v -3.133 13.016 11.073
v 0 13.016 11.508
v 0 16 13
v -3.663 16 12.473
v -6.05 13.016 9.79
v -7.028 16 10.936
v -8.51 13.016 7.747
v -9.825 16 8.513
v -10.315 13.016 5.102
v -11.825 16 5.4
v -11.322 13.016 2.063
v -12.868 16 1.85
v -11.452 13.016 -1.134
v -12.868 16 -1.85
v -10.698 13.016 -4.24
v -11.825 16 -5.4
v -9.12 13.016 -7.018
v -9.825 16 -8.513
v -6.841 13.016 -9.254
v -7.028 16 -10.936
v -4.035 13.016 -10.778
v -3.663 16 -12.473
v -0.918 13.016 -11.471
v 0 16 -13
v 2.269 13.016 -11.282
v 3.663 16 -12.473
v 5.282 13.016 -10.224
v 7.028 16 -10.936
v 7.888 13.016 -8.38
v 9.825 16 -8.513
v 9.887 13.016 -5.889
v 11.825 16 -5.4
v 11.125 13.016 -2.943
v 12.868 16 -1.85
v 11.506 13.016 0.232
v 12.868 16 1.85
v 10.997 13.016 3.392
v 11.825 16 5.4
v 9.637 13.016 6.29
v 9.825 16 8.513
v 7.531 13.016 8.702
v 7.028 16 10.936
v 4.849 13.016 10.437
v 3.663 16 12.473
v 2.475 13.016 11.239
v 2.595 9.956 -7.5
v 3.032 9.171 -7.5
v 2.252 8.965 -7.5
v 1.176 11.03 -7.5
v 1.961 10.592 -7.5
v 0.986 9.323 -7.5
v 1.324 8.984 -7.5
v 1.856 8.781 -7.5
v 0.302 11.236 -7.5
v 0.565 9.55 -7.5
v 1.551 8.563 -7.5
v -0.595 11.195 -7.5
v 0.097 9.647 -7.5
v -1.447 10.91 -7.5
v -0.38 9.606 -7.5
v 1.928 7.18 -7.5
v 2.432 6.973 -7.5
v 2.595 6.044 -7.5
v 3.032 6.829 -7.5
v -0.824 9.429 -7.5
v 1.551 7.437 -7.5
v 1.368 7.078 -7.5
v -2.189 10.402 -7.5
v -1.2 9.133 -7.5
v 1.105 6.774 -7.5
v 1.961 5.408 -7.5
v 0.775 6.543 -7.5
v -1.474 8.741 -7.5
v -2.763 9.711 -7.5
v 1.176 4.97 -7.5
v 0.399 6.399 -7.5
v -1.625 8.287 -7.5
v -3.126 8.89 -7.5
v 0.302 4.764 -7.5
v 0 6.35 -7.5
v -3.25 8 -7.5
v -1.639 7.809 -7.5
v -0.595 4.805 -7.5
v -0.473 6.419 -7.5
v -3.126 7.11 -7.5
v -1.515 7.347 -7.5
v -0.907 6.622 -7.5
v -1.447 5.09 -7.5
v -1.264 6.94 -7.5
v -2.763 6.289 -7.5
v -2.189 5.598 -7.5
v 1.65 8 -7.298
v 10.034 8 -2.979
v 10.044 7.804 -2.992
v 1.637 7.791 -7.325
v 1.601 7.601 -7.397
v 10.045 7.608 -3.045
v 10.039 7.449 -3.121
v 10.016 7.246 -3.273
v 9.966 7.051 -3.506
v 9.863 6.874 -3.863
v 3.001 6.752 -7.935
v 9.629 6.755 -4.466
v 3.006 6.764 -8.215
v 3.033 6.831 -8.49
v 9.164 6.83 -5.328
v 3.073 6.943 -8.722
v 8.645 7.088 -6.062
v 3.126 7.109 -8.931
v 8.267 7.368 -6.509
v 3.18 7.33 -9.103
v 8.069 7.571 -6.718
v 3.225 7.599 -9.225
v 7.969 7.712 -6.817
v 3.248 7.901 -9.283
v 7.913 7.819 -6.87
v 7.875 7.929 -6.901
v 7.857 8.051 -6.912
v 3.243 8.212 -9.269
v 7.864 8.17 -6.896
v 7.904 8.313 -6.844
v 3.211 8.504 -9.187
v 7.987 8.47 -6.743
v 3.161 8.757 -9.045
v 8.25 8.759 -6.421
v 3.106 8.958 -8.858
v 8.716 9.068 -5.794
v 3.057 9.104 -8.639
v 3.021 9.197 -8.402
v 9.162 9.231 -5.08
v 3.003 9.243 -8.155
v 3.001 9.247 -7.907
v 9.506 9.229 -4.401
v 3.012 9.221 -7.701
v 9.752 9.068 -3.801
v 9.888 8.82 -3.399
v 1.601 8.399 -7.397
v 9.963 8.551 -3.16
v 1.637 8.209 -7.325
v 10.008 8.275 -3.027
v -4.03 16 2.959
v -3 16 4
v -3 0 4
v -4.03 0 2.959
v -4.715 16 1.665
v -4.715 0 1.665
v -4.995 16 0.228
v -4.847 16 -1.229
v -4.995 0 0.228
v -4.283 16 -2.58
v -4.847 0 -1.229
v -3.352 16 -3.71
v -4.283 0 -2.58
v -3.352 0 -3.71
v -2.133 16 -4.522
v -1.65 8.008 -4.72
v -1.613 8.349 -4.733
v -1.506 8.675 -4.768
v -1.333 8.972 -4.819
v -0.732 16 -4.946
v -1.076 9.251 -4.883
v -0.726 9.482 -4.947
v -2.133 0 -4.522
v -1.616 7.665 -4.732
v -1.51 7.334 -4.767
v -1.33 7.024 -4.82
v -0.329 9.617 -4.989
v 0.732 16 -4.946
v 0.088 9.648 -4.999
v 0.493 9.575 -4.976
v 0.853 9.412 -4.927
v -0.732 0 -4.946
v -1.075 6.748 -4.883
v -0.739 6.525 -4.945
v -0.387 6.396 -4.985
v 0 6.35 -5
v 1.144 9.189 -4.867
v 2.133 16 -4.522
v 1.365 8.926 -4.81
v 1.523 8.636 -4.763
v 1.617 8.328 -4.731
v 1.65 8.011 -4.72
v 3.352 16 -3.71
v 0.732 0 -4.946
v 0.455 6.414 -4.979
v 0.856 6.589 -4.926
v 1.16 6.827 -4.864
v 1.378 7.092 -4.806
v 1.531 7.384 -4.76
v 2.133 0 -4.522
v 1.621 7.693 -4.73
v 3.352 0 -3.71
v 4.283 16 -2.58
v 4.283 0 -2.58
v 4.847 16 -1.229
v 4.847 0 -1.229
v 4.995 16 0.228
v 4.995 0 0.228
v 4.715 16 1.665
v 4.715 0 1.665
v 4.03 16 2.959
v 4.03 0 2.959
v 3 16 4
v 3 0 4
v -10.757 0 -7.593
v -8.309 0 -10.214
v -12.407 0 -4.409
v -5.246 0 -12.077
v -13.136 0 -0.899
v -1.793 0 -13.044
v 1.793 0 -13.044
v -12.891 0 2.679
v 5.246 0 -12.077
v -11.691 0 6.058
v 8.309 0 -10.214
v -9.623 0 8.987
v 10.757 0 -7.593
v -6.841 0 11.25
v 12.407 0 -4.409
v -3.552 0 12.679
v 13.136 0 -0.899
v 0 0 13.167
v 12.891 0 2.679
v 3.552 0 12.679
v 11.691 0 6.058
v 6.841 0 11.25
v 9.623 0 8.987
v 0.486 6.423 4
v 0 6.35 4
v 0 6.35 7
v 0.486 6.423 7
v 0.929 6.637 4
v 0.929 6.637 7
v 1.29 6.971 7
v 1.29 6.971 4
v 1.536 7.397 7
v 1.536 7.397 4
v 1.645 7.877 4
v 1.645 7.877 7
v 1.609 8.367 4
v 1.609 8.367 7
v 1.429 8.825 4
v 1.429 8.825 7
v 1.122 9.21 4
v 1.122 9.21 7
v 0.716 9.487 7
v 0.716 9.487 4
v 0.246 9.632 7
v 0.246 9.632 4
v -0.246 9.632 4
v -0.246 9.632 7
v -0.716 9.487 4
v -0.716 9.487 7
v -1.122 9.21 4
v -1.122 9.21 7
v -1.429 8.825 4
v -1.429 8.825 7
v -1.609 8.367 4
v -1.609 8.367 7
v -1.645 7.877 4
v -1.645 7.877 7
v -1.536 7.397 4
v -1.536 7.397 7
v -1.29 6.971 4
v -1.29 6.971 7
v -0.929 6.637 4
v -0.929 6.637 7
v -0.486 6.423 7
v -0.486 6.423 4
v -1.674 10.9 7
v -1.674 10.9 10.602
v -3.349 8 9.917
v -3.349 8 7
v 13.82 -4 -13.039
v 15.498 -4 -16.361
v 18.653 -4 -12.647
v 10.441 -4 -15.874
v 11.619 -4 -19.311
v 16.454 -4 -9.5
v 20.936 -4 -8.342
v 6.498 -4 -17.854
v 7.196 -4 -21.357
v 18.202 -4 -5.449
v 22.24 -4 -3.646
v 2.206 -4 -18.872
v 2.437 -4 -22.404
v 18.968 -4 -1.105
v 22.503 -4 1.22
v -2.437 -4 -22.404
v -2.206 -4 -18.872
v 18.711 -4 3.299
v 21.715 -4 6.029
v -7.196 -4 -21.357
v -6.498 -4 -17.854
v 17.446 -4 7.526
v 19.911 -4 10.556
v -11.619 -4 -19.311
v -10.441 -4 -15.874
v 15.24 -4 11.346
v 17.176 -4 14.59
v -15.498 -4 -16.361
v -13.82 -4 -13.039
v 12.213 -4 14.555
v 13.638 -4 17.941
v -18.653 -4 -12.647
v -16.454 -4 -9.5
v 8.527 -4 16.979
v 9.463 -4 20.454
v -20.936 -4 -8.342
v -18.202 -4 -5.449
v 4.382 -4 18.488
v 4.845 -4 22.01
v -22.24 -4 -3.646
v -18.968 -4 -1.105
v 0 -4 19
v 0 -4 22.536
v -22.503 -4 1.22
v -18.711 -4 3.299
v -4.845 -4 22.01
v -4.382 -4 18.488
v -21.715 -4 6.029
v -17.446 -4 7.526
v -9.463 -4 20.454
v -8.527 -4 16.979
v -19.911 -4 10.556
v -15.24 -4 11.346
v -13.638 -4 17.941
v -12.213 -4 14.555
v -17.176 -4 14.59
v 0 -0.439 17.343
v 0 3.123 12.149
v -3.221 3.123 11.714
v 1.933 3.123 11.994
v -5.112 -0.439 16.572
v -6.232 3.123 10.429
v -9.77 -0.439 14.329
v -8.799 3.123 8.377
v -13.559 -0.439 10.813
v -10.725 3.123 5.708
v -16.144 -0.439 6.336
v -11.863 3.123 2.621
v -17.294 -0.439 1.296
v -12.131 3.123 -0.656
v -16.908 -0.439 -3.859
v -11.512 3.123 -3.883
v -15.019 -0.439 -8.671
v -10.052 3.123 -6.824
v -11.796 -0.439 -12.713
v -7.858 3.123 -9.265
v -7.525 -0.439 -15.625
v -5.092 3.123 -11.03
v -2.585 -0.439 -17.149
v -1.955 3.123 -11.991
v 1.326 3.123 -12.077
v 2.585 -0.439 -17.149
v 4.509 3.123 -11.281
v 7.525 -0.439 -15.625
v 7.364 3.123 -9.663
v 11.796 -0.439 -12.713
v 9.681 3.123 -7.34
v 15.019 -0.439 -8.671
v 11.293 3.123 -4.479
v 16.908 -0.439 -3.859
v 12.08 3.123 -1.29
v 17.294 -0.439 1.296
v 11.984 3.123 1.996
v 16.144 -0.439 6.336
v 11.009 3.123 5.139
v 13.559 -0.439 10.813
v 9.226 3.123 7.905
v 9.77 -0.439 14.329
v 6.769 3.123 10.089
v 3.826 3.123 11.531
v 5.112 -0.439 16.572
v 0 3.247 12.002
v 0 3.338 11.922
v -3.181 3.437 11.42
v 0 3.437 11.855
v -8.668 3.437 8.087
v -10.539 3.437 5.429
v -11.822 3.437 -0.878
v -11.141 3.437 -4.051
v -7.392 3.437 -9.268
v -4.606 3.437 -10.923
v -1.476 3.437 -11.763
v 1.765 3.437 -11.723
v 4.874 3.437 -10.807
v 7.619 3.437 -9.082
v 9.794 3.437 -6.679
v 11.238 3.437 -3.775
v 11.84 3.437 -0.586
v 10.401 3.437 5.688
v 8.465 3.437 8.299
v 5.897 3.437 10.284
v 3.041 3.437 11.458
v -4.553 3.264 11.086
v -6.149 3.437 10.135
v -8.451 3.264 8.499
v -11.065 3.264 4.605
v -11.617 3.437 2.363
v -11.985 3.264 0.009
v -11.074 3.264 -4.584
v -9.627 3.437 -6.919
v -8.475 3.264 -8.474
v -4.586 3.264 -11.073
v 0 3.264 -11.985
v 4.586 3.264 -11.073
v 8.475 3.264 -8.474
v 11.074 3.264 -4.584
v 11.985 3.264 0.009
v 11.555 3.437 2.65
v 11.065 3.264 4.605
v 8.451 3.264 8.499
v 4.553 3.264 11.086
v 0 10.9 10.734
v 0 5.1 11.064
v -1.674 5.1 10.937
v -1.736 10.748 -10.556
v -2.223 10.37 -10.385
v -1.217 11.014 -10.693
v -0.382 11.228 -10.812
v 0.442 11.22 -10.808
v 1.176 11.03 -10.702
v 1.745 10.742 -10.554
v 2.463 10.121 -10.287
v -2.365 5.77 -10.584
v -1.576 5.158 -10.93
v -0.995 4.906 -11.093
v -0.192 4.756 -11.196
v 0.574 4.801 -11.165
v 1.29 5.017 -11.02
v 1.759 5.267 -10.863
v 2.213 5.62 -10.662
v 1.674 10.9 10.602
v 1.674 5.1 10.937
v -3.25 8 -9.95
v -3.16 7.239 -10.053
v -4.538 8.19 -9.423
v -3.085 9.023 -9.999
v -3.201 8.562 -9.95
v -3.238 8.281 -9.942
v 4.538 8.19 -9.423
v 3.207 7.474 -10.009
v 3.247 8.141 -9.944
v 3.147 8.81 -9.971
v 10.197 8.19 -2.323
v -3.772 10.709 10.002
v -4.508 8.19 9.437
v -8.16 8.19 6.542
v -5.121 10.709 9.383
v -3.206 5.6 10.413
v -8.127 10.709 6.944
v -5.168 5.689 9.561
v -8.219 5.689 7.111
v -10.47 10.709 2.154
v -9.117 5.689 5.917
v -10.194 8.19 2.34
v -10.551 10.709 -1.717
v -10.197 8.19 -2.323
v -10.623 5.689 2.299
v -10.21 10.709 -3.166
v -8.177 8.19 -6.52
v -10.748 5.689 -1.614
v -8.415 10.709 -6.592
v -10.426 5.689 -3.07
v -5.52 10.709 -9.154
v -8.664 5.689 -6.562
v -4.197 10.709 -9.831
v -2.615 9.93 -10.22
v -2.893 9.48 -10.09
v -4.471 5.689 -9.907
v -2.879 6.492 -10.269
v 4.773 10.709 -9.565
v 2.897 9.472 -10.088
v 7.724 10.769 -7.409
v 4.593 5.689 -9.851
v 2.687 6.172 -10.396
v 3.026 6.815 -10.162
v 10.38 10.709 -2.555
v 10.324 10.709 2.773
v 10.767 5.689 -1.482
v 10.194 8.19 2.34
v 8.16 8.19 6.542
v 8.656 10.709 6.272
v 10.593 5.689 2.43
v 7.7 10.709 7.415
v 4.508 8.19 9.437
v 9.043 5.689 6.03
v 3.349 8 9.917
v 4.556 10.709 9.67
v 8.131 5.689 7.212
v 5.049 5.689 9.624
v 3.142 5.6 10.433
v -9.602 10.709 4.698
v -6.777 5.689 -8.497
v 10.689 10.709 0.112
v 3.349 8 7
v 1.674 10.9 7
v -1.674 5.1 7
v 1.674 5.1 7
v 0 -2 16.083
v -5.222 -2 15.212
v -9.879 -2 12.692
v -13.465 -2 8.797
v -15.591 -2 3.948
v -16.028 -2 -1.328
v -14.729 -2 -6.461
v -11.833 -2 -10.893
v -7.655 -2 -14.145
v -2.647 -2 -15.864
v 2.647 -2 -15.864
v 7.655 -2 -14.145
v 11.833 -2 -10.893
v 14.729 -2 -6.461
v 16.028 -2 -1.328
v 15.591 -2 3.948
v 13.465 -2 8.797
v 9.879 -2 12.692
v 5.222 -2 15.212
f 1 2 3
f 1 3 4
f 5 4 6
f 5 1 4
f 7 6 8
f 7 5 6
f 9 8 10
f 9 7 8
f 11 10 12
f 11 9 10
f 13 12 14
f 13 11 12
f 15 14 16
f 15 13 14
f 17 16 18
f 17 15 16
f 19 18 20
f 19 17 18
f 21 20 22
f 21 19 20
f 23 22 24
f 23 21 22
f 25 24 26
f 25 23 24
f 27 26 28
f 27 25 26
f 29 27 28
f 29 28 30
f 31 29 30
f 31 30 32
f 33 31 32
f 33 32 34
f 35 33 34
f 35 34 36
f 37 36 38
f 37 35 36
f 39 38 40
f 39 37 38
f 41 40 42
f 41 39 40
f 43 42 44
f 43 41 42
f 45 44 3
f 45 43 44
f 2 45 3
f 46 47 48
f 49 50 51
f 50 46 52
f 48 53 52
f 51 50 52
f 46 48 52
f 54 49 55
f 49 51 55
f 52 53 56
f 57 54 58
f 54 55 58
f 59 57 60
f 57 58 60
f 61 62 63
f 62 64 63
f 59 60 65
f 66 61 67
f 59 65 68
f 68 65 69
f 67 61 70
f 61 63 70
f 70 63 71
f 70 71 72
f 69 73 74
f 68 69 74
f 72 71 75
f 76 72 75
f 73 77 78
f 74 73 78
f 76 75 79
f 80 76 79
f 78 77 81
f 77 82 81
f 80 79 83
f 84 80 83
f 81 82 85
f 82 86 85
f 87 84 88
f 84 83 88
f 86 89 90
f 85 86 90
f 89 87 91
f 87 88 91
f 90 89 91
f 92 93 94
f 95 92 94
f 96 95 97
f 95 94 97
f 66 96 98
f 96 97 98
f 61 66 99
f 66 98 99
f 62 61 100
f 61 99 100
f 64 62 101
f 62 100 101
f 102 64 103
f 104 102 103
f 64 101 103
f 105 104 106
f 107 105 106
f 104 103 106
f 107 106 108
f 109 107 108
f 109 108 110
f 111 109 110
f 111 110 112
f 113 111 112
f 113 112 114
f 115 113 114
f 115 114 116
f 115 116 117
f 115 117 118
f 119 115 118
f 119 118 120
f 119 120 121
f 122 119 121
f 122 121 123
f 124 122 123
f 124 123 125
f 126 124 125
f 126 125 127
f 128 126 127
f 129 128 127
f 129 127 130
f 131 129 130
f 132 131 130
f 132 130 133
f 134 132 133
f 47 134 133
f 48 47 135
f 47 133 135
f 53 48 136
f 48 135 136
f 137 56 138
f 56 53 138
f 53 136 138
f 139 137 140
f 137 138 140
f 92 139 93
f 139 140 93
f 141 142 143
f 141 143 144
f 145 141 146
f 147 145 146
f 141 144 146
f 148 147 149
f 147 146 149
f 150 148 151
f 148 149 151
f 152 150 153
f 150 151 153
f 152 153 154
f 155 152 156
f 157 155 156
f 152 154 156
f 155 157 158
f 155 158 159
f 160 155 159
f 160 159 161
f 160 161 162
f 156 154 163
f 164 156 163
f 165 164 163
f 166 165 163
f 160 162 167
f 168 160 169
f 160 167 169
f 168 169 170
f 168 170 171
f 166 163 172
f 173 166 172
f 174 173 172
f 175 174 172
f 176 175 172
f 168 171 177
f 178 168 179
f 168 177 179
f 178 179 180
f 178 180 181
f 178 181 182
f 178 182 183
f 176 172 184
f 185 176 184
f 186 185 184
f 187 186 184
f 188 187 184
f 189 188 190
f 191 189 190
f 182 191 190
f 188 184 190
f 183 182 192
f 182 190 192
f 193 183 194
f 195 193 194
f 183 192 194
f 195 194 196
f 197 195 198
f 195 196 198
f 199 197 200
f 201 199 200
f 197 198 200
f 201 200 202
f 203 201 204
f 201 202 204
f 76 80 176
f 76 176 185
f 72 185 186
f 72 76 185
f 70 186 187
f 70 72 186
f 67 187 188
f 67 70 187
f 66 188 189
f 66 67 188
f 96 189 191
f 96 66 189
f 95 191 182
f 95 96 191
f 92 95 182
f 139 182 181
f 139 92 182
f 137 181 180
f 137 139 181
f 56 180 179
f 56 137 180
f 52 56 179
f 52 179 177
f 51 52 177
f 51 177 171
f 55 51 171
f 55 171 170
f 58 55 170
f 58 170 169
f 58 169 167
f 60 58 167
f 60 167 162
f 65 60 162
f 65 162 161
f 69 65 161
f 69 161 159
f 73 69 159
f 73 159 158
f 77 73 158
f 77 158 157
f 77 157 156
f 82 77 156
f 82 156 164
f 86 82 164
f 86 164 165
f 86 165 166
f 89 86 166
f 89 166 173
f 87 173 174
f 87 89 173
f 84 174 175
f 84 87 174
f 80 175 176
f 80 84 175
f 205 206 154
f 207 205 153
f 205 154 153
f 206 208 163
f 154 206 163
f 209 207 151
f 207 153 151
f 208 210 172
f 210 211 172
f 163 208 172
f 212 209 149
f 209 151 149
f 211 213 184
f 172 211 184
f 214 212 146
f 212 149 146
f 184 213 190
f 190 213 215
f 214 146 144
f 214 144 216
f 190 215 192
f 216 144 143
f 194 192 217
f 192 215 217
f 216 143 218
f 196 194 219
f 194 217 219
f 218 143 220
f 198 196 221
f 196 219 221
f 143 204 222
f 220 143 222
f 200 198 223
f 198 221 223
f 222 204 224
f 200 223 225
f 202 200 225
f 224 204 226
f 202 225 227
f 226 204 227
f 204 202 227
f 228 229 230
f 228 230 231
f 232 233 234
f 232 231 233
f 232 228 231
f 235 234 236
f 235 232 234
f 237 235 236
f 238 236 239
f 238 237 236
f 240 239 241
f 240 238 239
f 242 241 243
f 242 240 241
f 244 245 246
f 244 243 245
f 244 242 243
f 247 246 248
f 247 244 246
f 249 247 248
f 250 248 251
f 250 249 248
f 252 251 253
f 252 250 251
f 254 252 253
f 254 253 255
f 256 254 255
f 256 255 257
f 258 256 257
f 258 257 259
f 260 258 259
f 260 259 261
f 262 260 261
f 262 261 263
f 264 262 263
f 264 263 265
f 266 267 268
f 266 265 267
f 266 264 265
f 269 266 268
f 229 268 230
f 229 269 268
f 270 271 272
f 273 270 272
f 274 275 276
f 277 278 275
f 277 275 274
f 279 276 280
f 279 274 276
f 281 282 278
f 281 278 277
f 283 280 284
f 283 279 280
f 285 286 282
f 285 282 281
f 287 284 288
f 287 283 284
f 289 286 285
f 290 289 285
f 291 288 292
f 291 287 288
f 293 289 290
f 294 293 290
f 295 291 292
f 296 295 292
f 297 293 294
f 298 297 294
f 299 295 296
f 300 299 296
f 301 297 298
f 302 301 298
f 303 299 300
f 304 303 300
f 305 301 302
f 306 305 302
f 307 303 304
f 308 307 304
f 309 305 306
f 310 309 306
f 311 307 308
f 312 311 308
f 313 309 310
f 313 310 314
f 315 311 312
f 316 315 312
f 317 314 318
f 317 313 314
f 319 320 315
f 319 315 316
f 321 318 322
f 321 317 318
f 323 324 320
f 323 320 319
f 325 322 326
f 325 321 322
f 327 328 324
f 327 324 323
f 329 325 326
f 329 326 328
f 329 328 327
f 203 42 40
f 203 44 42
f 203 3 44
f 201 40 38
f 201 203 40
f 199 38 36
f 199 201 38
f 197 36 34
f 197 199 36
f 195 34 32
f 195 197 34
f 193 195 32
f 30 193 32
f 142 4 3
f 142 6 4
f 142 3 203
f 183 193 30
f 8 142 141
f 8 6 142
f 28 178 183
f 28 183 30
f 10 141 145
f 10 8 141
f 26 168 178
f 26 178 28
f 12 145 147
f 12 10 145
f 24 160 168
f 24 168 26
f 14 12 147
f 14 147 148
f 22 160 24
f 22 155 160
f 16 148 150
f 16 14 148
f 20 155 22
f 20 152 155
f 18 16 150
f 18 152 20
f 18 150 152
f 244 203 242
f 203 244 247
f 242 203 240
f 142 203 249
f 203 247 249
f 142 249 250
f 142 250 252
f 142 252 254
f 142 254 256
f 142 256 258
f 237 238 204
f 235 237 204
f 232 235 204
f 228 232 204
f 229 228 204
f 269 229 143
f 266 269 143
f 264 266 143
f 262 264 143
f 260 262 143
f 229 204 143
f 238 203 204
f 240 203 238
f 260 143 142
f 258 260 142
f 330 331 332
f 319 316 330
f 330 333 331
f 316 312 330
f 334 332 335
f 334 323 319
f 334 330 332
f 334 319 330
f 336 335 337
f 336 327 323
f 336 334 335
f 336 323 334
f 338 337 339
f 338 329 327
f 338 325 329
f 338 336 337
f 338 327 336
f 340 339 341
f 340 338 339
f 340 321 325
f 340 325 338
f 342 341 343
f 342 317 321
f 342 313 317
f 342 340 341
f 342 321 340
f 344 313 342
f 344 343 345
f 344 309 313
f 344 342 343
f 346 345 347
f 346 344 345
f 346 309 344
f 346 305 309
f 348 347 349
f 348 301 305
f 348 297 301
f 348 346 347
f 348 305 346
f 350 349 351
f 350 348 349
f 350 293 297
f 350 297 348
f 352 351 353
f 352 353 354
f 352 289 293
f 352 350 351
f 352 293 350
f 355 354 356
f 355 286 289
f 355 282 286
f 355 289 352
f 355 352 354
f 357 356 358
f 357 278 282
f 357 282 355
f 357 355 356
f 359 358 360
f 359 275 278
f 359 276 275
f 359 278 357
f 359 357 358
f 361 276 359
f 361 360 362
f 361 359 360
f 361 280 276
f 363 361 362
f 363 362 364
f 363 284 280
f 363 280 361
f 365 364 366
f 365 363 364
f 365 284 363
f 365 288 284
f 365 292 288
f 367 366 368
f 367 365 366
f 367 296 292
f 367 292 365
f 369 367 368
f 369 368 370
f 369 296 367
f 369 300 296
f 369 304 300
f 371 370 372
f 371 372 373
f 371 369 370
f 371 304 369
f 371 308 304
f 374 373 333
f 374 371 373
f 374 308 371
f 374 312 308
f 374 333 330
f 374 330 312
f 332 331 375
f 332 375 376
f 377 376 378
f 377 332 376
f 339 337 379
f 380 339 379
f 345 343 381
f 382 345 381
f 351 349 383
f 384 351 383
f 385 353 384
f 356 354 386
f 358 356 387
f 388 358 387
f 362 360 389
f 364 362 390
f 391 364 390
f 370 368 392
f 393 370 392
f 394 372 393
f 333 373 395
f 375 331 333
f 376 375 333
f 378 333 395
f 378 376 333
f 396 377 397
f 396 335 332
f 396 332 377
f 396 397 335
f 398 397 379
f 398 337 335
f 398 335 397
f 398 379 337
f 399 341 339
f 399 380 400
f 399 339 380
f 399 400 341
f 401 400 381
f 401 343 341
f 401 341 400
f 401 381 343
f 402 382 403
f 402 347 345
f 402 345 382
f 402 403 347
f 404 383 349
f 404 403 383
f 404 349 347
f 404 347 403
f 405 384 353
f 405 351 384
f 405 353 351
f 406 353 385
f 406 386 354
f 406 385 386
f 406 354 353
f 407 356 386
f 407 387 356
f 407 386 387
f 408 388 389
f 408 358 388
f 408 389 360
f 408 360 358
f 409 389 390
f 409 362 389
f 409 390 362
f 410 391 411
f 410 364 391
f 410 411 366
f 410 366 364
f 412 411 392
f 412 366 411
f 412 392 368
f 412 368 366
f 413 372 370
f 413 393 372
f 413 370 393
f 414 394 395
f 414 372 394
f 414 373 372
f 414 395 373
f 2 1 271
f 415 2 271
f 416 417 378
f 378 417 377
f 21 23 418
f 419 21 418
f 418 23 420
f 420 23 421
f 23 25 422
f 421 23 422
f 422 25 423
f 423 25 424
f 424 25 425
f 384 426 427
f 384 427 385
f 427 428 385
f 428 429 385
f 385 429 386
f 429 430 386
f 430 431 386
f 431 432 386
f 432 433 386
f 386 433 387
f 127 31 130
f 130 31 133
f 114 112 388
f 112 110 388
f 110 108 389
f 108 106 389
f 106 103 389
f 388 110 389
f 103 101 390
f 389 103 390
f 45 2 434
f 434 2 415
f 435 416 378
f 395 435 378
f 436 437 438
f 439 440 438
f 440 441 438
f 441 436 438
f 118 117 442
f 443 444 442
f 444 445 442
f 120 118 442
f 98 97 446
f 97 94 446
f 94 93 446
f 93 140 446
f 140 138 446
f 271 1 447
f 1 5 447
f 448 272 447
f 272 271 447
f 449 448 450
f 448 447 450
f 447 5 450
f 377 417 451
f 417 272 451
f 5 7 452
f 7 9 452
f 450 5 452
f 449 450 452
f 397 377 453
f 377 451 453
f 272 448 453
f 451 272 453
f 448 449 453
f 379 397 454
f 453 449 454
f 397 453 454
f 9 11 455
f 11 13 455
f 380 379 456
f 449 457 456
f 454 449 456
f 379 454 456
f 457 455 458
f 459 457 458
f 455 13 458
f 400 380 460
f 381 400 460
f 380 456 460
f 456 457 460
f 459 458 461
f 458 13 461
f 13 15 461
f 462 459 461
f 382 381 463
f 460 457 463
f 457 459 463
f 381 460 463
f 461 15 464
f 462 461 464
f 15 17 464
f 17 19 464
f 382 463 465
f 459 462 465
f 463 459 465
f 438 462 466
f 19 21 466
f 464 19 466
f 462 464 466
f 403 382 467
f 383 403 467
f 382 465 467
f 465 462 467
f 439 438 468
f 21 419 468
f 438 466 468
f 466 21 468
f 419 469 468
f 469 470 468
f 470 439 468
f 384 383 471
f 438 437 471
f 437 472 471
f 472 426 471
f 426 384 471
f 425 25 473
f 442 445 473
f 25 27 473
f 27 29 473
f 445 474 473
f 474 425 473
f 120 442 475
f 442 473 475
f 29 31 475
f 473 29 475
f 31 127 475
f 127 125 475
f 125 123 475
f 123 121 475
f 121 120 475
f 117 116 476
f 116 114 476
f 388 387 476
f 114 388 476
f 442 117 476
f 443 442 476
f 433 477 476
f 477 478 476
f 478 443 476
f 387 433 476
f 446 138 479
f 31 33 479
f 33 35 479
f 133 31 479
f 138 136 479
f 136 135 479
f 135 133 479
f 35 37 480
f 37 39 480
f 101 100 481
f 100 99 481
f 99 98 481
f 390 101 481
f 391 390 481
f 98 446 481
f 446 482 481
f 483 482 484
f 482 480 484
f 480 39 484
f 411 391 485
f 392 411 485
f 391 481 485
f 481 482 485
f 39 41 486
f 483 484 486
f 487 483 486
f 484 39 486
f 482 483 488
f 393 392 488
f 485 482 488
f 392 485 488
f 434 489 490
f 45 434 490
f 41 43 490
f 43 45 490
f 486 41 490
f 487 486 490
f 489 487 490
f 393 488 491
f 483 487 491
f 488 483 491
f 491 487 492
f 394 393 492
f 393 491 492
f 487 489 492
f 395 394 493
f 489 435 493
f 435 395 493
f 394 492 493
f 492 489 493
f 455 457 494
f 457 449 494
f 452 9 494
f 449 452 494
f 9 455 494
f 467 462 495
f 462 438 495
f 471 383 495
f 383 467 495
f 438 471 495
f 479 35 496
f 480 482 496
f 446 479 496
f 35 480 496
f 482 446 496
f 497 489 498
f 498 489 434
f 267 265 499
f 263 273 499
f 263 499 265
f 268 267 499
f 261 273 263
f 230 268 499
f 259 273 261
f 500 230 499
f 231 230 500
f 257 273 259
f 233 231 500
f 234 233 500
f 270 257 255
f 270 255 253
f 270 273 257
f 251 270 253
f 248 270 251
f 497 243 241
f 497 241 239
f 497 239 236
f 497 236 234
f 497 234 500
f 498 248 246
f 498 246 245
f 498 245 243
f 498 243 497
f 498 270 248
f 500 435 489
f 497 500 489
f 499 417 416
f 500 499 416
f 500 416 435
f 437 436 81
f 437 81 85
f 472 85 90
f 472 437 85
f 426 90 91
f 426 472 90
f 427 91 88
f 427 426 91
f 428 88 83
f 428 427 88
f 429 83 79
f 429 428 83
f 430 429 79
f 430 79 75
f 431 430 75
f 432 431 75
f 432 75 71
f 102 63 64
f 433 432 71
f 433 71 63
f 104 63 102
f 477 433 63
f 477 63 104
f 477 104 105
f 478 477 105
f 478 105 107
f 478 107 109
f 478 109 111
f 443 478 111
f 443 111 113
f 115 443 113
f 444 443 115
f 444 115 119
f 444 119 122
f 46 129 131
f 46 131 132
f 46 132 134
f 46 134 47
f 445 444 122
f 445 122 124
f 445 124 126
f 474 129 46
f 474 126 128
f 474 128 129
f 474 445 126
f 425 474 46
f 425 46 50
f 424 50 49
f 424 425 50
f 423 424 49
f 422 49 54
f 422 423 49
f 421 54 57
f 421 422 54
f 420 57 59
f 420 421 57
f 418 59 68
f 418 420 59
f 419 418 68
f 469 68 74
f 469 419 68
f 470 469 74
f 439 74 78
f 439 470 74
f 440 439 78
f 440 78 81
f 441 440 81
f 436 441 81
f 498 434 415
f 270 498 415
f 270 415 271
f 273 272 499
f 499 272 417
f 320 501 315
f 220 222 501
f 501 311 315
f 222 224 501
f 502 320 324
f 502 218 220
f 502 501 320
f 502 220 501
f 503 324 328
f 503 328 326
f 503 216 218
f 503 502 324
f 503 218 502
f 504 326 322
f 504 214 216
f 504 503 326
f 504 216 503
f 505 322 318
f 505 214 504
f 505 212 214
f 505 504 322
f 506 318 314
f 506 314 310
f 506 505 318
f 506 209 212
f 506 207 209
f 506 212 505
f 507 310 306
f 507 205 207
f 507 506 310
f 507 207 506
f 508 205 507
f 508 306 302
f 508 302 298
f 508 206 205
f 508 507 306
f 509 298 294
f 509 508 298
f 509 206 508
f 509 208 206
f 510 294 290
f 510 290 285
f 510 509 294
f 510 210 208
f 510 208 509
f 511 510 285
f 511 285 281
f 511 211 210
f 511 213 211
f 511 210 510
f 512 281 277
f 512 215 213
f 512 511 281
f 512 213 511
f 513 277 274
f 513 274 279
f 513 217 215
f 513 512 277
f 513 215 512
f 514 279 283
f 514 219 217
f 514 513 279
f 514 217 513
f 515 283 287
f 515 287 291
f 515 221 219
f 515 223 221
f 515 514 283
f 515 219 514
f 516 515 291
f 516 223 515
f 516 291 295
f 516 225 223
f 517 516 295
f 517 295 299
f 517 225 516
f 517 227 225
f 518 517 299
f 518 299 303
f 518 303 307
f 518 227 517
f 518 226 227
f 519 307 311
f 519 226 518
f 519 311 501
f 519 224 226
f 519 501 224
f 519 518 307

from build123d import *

# Parameters (mm, degrees)
SKETCH_1_R               = 8
EXTRUDE_1_DEPTH          = 16
FILLET_1_R               = 10
CUT_EXTRUDE_1_DEPTH      = 26.455844296
CUT_EXTRUDE_1_DEPTH_BACK = 26.455844296
SKETCH_3_R               = 1.65
CUT_EXTRUDE_2_DEPTH      = 8
SKETCH_6_R               = 3.25
CUT_EXTRUDE_3_DEPTH      = 7.5
FILLET_2_R               = 1


with BuildPart() as part:
    # 草图1 → 凸台-拉伸1 (new body)
    with BuildSketch(Plane(origin=(0, 0, 0), x_dir=(1, 0, 0), z_dir=(0, 1, 0))):
        with Locations(Location((0, 0, 0), (0, 0, 270))):
            Circle(SKETCH_1_R)
        with BuildLine():
            Line((3, -4), (-3, -4))
            ThreePointArc((-3, -4), (0, 5), (3, -4))
        make_face(mode=Mode.SUBTRACT)
    extrude(amount=EXTRUDE_1_DEPTH)

    # 草图2 → 旋转1 (revolve)
    with BuildSketch(Plane.XY, mode=Mode.PRIVATE) as revolve_1_sk:
        Polygon((8, 16), (13, 16), (9, 8), (14, 0), (8, 0), align=None)
    revolve(revolve_1_sk.sketch.rotate(Axis((0, 19.267994754, 0), (0, -1, 0)), 90), axis=Axis((0, 19.267994754, 0), (0, -1, 0)))

    # 圆角1
    fillet_1_edges = [part.edges().sort_by_distance(p)[0] for p in [
        (0, 8, -9),
    ]]
    fillet(fillet_1_edges, radius=FILLET_1_R)

    # 草图3 → 切除-拉伸1 (cut, two sides: drawn at the far end of the back side and taken through both)
    with BuildSketch(Plane.XY.offset(-CUT_EXTRUDE_1_DEPTH_BACK)):
        with Locations(Location((0, 8, 0), (0, 0, 270.000000028))):
            Circle(SKETCH_3_R)
    extrude(amount=CUT_EXTRUDE_1_DEPTH + CUT_EXTRUDE_1_DEPTH_BACK, mode=Mode.SUBTRACT)

    # 草图4 → 切除-拉伸2 (cut)
    with BuildSketch(Plane.XY.offset(15)):
        Polygon((3.348631561, 8), (1.674315781, 10.9), (-1.674315781, 10.9), (-3.348631561, 8), (-1.674315781, 5.1), (1.674315781, 5.1), align=None)
    extrude(amount=-CUT_EXTRUDE_2_DEPTH, mode=Mode.SUBTRACT)

    # 草图6 → 切除-拉伸3 (cut)
    with BuildSketch(Plane.XY.offset(-15)):
        with Locations(Location((0, 8, 0), (0, 0, 180))):
            Circle(SKETCH_6_R)
    extrude(amount=CUT_EXTRUDE_3_DEPTH, mode=Mode.SUBTRACT)

    # 草图7 → 旋转2 (revolve)
    with BuildSketch(Plane.XY, mode=Mode.PRIVATE) as revolve_2_sk:
        Polygon((11.972417526, 3.244131958), (22.536438981, -4), (19, -4), (13.166853107, 0), align=None)
    revolve(revolve_2_sk.sketch.rotate(Axis((0, 21.03700922, 0), (0, -1, 0)), 90), axis=Axis((0, 21.03700922, 0), (0, -1, 0)))

    # 圆角2
    fillet_2_edges = [part.edges().sort_by_distance(p)[0] for p in [
        (0, 3.244131958, -11.97241447),
    ]]
    fillet(fillet_2_edges, radius=FILLET_2_R)

    # 草图10 → 切除-旋转1 (revolve, cut)
    with BuildSketch(Plane(origin=(0, 8, 0), x_dir=(1, 0, 0), z_dir=(0, 1, 0)), mode=Mode.PRIVATE) as cut_revolve_1_sk:
        Polygon((1.254039401, 8.908286257), (1.826463655, 10.019515519), (14.936167514, 3.266352423), (14.36374326, 2.155123161), align=None)
    revolve(cut_revolve_1_sk.sketch.rotate(Axis((14.36374326, 8, -2.155123161), (0.8889834100103146, 0, 0.45793940289784313)), 180), axis=Axis((14.36374326, 8, -2.155123161), (0.8889834100103146, 0, 0.45793940289784313)), mode=Mode.SUBTRACT)


solid = part.part
